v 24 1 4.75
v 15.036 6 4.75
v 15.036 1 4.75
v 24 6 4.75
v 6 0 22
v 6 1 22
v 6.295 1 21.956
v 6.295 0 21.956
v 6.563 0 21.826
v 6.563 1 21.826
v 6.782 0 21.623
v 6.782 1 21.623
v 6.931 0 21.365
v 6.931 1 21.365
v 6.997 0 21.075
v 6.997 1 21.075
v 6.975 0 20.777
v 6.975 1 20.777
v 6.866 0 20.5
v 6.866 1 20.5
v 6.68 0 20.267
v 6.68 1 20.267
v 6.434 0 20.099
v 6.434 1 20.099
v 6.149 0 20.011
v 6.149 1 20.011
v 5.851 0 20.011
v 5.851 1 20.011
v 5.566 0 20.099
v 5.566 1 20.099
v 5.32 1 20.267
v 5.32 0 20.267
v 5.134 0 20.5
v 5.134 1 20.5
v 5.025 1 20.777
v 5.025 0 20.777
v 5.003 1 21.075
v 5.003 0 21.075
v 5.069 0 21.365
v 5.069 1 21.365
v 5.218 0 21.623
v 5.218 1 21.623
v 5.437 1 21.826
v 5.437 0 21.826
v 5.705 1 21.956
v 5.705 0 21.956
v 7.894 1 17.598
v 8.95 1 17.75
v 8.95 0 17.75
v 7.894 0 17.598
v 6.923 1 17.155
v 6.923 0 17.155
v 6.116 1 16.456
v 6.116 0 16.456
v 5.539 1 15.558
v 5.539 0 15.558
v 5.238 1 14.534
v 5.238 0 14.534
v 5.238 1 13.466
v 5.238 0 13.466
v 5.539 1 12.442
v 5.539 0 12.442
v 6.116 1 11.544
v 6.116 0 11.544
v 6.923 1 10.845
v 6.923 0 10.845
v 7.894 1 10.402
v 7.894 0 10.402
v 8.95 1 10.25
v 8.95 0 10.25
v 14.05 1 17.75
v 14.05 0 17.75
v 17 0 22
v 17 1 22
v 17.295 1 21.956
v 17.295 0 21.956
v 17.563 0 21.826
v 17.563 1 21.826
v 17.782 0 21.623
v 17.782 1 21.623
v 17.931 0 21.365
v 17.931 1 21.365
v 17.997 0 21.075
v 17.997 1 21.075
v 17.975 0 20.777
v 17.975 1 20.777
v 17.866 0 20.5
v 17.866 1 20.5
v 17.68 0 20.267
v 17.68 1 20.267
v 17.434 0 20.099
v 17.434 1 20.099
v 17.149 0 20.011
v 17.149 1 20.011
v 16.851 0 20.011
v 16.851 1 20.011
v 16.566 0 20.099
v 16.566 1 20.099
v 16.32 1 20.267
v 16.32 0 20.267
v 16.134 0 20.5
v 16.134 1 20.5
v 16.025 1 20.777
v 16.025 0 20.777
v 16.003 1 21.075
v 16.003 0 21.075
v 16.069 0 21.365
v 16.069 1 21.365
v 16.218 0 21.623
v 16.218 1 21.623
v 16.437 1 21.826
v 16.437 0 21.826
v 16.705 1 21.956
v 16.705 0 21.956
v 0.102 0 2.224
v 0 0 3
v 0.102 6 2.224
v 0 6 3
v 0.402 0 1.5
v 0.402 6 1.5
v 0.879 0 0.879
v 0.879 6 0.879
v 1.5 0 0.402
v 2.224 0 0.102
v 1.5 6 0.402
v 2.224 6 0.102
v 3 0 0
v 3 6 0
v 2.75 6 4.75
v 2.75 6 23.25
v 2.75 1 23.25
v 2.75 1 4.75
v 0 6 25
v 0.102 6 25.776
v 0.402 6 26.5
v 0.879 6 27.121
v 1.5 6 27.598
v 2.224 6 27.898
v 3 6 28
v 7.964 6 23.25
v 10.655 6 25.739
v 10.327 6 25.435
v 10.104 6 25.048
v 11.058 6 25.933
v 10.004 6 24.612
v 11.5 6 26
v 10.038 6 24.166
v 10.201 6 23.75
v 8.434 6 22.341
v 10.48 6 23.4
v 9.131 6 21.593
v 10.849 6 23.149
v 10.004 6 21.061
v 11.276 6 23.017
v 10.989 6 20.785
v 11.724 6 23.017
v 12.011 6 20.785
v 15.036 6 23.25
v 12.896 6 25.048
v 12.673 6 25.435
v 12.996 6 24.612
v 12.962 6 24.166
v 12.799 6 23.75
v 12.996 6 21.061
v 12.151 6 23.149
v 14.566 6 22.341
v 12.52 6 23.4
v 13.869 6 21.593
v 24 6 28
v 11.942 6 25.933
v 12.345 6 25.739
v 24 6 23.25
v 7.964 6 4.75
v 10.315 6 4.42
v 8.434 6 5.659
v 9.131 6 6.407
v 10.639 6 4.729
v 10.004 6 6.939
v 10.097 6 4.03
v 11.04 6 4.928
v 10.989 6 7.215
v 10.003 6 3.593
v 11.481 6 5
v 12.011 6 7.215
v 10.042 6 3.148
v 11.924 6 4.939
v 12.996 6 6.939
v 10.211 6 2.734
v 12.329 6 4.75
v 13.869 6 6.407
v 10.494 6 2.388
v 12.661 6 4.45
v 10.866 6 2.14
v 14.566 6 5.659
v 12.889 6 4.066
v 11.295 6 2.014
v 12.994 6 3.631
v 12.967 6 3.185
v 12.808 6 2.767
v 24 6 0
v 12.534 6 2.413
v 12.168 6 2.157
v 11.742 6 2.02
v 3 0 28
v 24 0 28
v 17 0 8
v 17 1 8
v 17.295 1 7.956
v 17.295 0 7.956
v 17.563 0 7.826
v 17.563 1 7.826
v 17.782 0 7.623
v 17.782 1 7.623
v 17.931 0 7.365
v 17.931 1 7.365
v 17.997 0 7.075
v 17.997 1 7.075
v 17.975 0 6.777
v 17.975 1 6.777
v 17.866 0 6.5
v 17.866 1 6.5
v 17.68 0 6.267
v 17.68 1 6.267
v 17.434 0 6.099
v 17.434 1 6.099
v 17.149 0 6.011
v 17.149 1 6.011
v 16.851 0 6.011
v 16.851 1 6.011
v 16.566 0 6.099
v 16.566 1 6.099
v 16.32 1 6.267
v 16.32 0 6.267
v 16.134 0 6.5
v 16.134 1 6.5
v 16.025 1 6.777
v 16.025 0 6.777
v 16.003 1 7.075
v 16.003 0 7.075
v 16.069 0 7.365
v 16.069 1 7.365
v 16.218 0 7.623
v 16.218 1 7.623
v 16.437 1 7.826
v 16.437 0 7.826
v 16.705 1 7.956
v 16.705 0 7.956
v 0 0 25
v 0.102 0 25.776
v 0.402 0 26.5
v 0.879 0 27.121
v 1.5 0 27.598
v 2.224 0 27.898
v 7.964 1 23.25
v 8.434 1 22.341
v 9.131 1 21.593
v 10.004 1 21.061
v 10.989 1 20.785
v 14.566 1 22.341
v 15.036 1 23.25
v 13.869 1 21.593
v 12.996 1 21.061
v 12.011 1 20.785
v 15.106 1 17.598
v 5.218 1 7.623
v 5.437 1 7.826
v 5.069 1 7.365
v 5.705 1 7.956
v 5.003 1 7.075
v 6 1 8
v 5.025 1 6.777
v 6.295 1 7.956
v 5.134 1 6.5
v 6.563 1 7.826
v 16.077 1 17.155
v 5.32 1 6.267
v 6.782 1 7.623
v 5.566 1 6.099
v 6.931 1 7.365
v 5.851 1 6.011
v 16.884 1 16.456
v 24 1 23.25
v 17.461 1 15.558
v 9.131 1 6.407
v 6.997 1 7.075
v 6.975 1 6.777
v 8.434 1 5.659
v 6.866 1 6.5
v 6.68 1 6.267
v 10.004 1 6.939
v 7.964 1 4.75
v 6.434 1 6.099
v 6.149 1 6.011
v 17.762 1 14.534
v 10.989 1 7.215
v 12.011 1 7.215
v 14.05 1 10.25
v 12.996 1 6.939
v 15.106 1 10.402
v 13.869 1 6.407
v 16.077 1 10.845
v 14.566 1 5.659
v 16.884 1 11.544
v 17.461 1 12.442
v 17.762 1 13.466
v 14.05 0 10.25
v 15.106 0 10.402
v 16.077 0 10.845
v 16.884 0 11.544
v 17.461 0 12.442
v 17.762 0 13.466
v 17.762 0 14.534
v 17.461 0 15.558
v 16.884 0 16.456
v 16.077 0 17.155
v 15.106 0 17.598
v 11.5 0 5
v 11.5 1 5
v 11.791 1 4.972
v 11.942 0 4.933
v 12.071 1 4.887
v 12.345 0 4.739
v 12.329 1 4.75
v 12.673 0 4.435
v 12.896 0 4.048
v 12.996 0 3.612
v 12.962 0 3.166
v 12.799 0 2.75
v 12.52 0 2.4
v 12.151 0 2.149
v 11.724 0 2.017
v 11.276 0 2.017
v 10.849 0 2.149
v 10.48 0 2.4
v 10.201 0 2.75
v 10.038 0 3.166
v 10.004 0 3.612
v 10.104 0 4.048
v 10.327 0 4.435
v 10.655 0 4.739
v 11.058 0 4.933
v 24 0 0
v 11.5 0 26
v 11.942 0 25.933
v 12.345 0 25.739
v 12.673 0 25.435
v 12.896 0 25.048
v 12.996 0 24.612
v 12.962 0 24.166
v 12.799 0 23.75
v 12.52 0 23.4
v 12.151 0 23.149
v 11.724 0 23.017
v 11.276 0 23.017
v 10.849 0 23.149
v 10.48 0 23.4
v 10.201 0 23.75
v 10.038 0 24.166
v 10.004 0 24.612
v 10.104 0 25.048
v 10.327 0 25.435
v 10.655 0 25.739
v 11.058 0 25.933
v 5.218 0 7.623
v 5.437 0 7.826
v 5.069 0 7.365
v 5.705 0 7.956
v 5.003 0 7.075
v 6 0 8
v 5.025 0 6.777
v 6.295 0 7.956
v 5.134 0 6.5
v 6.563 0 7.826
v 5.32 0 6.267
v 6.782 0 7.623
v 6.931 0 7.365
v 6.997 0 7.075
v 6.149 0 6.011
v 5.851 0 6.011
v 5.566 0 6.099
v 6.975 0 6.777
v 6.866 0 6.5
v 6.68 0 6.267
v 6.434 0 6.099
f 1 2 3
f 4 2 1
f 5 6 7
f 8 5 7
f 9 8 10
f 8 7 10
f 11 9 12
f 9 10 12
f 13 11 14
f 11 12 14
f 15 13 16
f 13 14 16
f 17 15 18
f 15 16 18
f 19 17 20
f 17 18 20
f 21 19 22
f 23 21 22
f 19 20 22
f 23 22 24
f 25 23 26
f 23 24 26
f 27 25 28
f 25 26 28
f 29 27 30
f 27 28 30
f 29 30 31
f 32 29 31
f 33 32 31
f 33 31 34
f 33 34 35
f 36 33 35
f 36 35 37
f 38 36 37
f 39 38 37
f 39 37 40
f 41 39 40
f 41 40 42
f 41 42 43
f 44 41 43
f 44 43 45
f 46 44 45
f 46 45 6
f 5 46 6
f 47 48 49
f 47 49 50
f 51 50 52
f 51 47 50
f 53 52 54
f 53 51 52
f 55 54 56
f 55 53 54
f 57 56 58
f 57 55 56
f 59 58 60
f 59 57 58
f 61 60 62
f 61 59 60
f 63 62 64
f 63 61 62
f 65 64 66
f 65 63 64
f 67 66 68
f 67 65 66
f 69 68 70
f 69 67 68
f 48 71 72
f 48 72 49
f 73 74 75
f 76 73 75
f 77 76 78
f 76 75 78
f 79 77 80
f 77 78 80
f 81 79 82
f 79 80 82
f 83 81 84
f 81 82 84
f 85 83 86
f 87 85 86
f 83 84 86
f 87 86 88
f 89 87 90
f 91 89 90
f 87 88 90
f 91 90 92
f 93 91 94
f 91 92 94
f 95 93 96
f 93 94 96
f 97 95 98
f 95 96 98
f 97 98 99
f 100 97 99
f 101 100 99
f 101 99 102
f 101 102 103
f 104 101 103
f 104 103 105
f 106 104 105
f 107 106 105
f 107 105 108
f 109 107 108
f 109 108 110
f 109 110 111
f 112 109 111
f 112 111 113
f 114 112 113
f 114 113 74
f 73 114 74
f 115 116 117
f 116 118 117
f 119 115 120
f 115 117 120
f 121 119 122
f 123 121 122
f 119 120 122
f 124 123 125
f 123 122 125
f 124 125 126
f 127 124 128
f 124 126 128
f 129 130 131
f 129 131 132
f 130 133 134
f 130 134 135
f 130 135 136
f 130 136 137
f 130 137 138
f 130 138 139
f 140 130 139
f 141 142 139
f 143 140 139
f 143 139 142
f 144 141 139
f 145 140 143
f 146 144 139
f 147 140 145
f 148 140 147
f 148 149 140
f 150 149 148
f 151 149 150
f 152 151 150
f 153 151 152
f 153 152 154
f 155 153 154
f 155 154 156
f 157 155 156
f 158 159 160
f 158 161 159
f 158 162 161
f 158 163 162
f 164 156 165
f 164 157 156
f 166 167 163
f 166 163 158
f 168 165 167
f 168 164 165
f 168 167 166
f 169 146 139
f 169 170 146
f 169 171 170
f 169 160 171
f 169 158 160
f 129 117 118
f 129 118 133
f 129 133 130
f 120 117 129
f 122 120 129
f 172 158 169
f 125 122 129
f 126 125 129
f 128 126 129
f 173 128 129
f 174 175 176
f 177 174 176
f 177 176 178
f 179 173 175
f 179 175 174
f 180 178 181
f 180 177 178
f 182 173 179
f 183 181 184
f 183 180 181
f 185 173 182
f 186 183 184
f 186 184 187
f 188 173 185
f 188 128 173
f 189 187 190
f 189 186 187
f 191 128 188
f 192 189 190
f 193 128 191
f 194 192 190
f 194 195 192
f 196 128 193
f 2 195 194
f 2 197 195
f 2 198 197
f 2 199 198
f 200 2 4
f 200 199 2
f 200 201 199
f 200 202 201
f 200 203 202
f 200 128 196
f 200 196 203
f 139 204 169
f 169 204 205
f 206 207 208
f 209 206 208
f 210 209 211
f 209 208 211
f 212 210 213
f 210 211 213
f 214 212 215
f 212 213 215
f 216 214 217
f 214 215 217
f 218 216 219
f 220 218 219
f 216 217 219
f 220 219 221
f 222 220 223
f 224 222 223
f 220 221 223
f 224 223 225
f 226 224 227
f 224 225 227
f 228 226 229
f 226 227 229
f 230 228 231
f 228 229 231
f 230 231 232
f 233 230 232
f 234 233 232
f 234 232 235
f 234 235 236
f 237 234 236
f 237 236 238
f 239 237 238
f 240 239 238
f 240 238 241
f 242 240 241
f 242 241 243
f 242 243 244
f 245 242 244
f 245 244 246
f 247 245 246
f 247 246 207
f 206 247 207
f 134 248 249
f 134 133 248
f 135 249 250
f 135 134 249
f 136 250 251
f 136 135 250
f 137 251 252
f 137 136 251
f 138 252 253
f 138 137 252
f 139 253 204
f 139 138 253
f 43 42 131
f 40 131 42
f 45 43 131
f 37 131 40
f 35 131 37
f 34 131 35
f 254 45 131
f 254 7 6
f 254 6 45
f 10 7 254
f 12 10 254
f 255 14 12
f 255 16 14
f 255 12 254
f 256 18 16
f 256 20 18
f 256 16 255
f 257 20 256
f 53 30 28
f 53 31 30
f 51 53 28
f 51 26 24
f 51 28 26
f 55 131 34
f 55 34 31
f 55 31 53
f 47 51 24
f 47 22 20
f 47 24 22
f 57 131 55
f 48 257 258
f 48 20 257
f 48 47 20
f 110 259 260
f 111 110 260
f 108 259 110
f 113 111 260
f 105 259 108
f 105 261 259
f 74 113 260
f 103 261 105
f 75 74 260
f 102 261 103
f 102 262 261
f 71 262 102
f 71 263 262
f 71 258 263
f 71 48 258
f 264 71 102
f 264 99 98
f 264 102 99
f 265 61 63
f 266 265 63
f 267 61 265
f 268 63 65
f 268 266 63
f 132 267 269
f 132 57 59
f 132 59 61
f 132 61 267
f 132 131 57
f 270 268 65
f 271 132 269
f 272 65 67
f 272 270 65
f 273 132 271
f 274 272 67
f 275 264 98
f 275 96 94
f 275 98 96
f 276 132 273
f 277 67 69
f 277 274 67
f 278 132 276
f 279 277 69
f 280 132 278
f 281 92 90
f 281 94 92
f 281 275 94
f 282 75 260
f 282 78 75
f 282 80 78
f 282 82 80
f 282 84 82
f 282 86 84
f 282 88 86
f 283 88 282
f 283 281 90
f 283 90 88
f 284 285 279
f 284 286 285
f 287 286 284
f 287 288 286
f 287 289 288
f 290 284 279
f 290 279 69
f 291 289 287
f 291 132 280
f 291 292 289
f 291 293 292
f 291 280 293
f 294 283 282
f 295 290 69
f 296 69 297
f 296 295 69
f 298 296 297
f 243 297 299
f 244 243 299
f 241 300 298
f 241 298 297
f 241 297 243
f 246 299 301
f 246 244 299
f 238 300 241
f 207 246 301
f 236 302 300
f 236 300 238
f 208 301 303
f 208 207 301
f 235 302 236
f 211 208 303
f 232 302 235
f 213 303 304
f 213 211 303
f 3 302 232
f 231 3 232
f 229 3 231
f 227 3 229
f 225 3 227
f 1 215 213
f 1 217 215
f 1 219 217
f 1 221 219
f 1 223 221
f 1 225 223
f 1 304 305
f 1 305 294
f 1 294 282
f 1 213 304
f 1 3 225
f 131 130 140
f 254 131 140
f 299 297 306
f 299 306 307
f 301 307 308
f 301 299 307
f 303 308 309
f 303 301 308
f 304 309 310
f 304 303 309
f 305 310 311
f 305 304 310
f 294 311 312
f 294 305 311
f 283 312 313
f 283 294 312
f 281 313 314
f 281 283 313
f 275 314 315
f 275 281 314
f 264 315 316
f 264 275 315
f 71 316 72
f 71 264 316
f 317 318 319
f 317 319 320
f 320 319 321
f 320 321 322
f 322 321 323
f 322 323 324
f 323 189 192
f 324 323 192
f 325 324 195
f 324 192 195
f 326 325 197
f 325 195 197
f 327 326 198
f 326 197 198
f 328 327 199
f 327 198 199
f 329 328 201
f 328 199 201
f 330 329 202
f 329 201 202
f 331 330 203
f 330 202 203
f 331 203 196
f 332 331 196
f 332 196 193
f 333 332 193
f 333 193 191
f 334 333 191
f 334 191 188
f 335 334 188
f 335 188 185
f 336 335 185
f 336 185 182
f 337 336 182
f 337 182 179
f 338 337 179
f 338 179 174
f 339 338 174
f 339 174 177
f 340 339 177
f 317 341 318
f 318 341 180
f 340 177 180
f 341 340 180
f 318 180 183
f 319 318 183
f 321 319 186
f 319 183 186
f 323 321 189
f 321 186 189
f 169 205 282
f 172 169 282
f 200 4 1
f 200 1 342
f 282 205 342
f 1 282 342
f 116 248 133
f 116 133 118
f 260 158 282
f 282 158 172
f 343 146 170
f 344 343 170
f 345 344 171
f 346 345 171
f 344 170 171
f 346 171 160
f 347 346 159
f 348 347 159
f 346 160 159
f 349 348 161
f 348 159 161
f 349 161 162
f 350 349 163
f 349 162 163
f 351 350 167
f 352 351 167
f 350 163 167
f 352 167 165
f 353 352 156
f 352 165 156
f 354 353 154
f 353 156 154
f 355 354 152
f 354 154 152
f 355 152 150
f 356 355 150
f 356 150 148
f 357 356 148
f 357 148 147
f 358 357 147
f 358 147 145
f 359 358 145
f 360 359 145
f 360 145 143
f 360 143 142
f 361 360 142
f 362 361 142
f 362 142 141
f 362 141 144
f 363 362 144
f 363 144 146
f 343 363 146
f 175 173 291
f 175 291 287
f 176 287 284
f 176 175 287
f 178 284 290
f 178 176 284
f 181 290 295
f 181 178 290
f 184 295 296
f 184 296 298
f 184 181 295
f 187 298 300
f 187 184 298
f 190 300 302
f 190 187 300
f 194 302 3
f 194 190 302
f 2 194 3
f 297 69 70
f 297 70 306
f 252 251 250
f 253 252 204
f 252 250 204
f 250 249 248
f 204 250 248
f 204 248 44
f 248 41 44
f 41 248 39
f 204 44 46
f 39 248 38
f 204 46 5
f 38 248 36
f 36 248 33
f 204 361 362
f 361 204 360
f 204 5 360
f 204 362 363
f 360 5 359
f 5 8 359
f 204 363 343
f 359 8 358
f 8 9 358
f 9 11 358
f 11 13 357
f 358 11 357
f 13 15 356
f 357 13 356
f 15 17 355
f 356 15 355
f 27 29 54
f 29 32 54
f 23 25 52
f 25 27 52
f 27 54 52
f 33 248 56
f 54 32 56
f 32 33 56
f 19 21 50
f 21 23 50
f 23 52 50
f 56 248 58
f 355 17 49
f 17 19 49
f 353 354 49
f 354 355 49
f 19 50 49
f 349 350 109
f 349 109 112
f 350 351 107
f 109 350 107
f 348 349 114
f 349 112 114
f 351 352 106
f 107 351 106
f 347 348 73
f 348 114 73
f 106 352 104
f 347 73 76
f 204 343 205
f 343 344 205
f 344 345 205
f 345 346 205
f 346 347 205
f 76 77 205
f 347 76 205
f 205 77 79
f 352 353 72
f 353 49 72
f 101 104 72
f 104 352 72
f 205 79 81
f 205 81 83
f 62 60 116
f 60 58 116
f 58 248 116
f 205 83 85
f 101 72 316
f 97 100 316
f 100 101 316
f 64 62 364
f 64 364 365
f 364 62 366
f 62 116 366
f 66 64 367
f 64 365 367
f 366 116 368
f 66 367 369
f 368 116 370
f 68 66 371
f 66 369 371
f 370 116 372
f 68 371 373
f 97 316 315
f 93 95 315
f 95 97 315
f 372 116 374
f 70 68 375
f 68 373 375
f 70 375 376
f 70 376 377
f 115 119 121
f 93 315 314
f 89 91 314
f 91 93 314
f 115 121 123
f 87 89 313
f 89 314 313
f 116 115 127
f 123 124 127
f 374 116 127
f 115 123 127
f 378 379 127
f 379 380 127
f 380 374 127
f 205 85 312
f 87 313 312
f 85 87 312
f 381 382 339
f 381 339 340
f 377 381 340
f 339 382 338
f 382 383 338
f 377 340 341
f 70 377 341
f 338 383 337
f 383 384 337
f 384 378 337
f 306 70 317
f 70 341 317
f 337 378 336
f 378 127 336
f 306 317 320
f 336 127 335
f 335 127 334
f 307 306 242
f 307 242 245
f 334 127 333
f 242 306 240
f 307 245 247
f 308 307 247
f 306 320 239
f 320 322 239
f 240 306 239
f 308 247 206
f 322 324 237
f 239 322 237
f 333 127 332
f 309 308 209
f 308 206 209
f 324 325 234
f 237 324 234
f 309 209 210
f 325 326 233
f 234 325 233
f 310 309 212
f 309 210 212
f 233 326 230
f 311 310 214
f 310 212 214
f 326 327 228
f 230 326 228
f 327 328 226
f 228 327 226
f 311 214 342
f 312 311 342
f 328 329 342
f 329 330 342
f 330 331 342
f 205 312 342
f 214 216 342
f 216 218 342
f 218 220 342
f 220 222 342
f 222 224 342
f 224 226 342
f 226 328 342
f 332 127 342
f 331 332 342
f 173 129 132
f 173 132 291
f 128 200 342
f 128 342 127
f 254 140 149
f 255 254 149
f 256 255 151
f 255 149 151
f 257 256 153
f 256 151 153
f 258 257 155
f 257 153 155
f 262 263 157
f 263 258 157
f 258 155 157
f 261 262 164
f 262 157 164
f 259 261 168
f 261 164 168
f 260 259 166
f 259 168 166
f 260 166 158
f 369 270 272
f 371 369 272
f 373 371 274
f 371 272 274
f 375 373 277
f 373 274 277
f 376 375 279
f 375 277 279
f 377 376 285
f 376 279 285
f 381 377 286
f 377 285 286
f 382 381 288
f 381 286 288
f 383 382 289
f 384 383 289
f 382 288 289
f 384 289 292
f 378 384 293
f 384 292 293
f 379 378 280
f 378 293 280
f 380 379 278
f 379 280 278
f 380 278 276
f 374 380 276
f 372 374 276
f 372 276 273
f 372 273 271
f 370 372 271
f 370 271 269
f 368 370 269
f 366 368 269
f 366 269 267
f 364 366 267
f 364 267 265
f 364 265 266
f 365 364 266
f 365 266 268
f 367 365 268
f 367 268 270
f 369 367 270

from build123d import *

# Parameters (mm, degrees)
SKETCH_1_W          = 24
SKETCH_1_H          = 28
EXTRUDE_1_DEPTH     = 6
SKETCH_2_W          = 17.5
SKETCH_2_H          = 18.5
CUT_EXTRUDE_3_DEPTH = 5
SKETCH_4_R          = 1
CUT_EXTRUDE_4_DEPTH = 5
SKETCH_5_W          = 3.75
SKETCH_5_H          = 18.5
CUT_EXTRUDE_5_DEPTH = 5
FILLET_1_R          = 3
SKETCH_7_R          = 1.5
EXTRUDE_4_DEPTH     = 6
SKETCH_12_R         = 1.5
CUT_EXTRUDE_6_DEPTH = 10


with BuildPart() as part:
    # 草图1 → 凸台-拉伸1 (new body)
    with BuildSketch(Plane(origin=(0, 0, 0), x_dir=(1, 0, 0), z_dir=(0, 1, 0))):
        with Locations((12, -14)):
            Rectangle(SKETCH_1_W, SKETCH_1_H)
    extrude(amount=EXTRUDE_1_DEPTH)

    # 草图2 → 切除-拉伸3 (cut)
    with BuildSketch(Plane(origin=(0, 6, 0), x_dir=(1, 0, 0), z_dir=(0, 1, 0))):
        with Locations((11.5, -14)):
            Rectangle(SKETCH_2_W, SKETCH_2_H)
    extrude(amount=-CUT_EXTRUDE_3_DEPTH, mode=Mode.SUBTRACT)

    # 草图4 → 切除-拉伸4 (cut)
    with BuildSketch(Plane(origin=(0, 1, 0), x_dir=(1, 0, 0), z_dir=(0, 1, 0))):
        with Locations(Location((6, -7, 0), (0, 0, 270))):
            Circle(SKETCH_4_R)
        with Locations(Location((17, -7, 0), (0, 0, 270))):
            Circle(SKETCH_4_R)
        with Locations(Location((6, -21, 0), (0, 0, 270))):
            Circle(SKETCH_4_R)
        with Locations(Location((17, -21, 0), (0, 0, 270))):
            Circle(SKETCH_4_R)
        with BuildLine():
            Line((8.95, -10.25), (14.05, -10.25))
            ThreePointArc((14.05, -10.25), (17.8, -14), (14.05, -17.75))
            Line((14.05, -17.75), (8.95, -17.75))
            ThreePointArc((8.95, -17.75), (5.2, -14), (8.95, -10.25))
        make_face()
    extrude(amount=-CUT_EXTRUDE_4_DEPTH, mode=Mode.SUBTRACT)

    # 草图5 → 切除-拉伸5 (cut)
    with BuildSketch(Plane(origin=(0, 6, 0), x_dir=(1, 0, 0), z_dir=(0, 1, 0))):
        with Locations((22.125, -14)):
            Rectangle(SKETCH_5_W, SKETCH_5_H)
    extrude(amount=-CUT_EXTRUDE_5_DEPTH, mode=Mode.SUBTRACT)

    # 圆角1
    fillet_1_edges = [part.edges().sort_by_distance(p)[0] for p in [
        (0, 3, 0),
        (0, 3, 28),
    ]]
    fillet(fillet_1_edges, radius=FILLET_1_R)

    # 草图7 → 凸台-拉伸4 (add)
    # profile 1 of 2: a face of its own
    with BuildSketch(Plane(origin=(0, 6, 0), x_dir=(1, 0, 0), z_dir=(0, 1, 0))):
        with BuildLine():
            Line((12.846291202, 0), (10.153708798, 0))
            ThreePointArc((10.153708798, 0), (11.5, -7.25), (12.846291202, 0))
        make_face()
        with Locations((11.5, -3.5)):
            Circle(SKETCH_7_R, mode=Mode.SUBTRACT)
    # profile 2 of 2: a face of its own
    with BuildSketch(Plane(origin=(0, 6, 0), x_dir=(1, 0, 0), z_dir=(0, 1, 0))):
        with BuildLine():
            Line((12.846291202, -28), (10.153708798, -28))
            ThreePointArc((10.153708798, -28), (11.5, -20.75), (12.846291202, -28))
        make_face()
        with Locations((11.5, -24.5)):
            Circle(SKETCH_7_R, mode=Mode.SUBTRACT)
    extrude(amount=-EXTRUDE_4_DEPTH)

    # 草图12 → 切除-拉伸6 (cut)
    with BuildSketch(Plane(origin=(0, 6, 0), x_dir=(1, 0, 0), z_dir=(0, 1, 0))):
        with Locations(Location((11.5, -3.5, 0), (0, 0, 270))):
            Circle(SKETCH_12_R)
        with Locations(Location((11.5, -24.5, 0), (0, 0, 270))):
            Circle(SKETCH_12_R)
    extrude(amount=-CUT_EXTRUDE_6_DEPTH, mode=Mode.SUBTRACT)


solid = part.part
